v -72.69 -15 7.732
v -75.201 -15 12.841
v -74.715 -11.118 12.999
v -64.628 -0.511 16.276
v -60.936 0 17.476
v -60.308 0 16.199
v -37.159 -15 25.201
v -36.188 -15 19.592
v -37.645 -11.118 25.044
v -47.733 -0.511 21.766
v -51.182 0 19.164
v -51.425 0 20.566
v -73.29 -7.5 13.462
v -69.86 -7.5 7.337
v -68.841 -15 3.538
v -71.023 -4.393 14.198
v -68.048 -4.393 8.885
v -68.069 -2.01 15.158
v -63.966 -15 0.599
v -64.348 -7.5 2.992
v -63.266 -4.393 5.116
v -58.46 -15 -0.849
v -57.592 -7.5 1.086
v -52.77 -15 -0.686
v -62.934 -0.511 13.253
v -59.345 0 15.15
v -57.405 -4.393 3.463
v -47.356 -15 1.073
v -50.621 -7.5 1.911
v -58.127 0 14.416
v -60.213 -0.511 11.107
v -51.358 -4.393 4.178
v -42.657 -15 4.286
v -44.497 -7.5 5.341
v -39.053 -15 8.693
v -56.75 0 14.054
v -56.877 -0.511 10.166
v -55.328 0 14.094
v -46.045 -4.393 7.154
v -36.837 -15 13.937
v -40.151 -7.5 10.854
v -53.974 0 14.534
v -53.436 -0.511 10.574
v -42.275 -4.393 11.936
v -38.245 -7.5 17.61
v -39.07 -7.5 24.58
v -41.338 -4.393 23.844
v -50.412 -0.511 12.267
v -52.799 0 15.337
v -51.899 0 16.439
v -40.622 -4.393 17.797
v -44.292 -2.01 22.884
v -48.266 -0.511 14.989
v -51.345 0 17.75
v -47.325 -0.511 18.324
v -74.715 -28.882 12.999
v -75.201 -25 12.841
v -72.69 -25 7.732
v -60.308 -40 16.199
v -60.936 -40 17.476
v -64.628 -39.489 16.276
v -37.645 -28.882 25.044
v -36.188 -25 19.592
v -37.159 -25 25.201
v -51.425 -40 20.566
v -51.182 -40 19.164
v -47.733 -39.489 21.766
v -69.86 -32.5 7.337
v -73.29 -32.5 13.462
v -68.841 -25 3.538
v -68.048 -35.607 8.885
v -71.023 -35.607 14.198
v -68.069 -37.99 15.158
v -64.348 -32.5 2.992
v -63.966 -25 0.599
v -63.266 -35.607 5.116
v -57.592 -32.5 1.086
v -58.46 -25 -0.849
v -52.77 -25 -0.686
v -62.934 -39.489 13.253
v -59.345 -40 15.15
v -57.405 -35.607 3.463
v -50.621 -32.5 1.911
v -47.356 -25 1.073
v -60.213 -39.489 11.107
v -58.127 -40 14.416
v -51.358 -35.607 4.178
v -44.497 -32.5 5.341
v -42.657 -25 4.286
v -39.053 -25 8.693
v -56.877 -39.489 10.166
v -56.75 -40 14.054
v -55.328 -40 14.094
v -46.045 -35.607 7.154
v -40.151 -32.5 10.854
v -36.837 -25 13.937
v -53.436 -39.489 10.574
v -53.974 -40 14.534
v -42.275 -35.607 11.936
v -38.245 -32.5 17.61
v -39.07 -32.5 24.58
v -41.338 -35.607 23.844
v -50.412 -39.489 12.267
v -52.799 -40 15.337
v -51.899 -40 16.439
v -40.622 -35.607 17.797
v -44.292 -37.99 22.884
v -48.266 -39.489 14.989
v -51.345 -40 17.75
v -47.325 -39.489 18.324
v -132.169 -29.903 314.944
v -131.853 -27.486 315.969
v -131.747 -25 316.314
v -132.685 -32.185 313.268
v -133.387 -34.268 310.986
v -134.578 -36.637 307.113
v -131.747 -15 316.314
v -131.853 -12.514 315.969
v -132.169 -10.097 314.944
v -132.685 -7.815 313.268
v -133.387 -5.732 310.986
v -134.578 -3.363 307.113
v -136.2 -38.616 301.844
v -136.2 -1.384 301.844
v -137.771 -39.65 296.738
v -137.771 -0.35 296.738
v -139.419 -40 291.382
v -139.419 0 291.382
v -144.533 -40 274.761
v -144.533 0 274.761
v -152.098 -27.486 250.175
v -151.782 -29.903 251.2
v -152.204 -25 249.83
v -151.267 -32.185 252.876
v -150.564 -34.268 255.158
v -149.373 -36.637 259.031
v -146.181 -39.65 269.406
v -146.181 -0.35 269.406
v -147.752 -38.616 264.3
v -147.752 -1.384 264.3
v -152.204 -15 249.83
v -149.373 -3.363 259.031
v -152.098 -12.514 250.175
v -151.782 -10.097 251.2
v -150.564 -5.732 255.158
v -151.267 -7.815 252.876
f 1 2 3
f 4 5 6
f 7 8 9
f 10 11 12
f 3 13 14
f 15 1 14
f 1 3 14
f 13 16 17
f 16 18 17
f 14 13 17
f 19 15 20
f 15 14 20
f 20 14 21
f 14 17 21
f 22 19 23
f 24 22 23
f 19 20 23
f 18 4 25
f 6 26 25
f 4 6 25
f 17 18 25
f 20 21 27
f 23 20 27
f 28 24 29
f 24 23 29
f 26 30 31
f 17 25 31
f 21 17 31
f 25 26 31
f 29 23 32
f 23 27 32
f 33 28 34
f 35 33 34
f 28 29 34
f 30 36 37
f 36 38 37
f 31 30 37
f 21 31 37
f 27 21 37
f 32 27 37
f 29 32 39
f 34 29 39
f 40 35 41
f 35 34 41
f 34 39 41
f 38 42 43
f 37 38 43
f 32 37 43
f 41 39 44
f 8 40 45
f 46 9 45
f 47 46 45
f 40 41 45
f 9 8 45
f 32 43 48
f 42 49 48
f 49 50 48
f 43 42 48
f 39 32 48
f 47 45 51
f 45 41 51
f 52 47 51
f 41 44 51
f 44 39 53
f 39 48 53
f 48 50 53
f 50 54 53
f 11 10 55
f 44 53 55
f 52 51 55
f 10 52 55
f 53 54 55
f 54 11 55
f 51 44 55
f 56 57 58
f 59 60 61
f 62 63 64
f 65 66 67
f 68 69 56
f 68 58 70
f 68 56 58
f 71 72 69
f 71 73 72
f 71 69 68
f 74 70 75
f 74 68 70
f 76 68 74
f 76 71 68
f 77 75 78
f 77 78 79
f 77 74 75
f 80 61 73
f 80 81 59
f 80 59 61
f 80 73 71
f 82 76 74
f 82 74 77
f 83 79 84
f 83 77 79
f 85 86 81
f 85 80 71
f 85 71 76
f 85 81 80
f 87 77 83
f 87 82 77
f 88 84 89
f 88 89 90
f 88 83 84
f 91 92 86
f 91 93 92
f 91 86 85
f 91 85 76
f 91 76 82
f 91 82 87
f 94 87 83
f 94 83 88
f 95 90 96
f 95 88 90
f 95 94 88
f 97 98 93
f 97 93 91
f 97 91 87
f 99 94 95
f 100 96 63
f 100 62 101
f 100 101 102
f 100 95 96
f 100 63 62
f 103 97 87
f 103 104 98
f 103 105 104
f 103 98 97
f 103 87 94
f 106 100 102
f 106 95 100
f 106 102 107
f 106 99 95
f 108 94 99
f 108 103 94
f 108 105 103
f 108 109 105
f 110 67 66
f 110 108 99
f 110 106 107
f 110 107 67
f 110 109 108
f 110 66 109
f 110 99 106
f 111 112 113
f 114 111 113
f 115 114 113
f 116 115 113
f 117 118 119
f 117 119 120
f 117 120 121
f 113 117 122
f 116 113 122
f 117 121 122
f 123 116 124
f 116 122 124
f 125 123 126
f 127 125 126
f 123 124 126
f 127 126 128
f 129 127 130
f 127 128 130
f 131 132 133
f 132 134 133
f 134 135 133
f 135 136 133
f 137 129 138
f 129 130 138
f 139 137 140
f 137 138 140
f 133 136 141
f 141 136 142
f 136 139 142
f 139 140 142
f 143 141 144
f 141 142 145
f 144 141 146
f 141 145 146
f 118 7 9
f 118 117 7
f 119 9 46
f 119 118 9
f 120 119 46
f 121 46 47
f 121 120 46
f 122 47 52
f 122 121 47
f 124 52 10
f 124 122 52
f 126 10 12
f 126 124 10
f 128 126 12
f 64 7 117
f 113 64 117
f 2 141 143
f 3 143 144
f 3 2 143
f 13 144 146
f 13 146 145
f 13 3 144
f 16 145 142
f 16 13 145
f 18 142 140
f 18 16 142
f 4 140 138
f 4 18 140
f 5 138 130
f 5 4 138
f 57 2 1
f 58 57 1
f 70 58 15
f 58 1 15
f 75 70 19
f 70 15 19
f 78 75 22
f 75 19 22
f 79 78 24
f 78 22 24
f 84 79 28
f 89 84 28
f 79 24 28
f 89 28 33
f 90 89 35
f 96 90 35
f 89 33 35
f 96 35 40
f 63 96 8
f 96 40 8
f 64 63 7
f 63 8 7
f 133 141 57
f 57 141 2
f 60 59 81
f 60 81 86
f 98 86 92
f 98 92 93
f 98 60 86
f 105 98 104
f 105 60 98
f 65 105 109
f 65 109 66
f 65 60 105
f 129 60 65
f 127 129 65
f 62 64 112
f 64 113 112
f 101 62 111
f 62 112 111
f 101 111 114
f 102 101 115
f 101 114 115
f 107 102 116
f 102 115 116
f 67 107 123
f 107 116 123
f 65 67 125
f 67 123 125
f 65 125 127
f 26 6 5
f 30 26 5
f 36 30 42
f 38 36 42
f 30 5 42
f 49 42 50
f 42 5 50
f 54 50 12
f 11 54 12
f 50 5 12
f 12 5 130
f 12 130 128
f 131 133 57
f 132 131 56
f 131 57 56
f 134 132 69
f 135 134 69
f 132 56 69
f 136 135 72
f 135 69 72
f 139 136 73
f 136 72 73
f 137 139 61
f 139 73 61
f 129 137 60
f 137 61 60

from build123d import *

# Parameters (mm, degrees)
F1_DEPTH = 40
F2_R     = 15


with BuildPart() as f1:
    # F0 (on Front) → F1 (new body)
    with BuildSketch(Plane.XZ):
        with BuildLine():
            ThreePointArc((-75.20147, 12.84079), (-50, 0), (-37.15921, 25.20147))
            Line((-37.15921, 25.20147), (-131.747338, 316.313797))
            Line((-131.747338, 316.313797), (-152.203911, 249.829936))
            Line((-152.203911, 249.829936), (-75.20147, 12.84079))
        make_face()
    extrude(amount=F1_DEPTH)

    # F2
    f2_edges = [f1.edges().sort_by_distance(p)[0] for p in [
        (-113.702691, 0, 131.335363),
        (-84.453274, 0, 170.757634),
        (-113.702691, -40, 131.335363),
        (-84.453274, -40, 170.757634),
    ]]
    fillet(f2_edges, radius=F2_R)


solid = f1.part
